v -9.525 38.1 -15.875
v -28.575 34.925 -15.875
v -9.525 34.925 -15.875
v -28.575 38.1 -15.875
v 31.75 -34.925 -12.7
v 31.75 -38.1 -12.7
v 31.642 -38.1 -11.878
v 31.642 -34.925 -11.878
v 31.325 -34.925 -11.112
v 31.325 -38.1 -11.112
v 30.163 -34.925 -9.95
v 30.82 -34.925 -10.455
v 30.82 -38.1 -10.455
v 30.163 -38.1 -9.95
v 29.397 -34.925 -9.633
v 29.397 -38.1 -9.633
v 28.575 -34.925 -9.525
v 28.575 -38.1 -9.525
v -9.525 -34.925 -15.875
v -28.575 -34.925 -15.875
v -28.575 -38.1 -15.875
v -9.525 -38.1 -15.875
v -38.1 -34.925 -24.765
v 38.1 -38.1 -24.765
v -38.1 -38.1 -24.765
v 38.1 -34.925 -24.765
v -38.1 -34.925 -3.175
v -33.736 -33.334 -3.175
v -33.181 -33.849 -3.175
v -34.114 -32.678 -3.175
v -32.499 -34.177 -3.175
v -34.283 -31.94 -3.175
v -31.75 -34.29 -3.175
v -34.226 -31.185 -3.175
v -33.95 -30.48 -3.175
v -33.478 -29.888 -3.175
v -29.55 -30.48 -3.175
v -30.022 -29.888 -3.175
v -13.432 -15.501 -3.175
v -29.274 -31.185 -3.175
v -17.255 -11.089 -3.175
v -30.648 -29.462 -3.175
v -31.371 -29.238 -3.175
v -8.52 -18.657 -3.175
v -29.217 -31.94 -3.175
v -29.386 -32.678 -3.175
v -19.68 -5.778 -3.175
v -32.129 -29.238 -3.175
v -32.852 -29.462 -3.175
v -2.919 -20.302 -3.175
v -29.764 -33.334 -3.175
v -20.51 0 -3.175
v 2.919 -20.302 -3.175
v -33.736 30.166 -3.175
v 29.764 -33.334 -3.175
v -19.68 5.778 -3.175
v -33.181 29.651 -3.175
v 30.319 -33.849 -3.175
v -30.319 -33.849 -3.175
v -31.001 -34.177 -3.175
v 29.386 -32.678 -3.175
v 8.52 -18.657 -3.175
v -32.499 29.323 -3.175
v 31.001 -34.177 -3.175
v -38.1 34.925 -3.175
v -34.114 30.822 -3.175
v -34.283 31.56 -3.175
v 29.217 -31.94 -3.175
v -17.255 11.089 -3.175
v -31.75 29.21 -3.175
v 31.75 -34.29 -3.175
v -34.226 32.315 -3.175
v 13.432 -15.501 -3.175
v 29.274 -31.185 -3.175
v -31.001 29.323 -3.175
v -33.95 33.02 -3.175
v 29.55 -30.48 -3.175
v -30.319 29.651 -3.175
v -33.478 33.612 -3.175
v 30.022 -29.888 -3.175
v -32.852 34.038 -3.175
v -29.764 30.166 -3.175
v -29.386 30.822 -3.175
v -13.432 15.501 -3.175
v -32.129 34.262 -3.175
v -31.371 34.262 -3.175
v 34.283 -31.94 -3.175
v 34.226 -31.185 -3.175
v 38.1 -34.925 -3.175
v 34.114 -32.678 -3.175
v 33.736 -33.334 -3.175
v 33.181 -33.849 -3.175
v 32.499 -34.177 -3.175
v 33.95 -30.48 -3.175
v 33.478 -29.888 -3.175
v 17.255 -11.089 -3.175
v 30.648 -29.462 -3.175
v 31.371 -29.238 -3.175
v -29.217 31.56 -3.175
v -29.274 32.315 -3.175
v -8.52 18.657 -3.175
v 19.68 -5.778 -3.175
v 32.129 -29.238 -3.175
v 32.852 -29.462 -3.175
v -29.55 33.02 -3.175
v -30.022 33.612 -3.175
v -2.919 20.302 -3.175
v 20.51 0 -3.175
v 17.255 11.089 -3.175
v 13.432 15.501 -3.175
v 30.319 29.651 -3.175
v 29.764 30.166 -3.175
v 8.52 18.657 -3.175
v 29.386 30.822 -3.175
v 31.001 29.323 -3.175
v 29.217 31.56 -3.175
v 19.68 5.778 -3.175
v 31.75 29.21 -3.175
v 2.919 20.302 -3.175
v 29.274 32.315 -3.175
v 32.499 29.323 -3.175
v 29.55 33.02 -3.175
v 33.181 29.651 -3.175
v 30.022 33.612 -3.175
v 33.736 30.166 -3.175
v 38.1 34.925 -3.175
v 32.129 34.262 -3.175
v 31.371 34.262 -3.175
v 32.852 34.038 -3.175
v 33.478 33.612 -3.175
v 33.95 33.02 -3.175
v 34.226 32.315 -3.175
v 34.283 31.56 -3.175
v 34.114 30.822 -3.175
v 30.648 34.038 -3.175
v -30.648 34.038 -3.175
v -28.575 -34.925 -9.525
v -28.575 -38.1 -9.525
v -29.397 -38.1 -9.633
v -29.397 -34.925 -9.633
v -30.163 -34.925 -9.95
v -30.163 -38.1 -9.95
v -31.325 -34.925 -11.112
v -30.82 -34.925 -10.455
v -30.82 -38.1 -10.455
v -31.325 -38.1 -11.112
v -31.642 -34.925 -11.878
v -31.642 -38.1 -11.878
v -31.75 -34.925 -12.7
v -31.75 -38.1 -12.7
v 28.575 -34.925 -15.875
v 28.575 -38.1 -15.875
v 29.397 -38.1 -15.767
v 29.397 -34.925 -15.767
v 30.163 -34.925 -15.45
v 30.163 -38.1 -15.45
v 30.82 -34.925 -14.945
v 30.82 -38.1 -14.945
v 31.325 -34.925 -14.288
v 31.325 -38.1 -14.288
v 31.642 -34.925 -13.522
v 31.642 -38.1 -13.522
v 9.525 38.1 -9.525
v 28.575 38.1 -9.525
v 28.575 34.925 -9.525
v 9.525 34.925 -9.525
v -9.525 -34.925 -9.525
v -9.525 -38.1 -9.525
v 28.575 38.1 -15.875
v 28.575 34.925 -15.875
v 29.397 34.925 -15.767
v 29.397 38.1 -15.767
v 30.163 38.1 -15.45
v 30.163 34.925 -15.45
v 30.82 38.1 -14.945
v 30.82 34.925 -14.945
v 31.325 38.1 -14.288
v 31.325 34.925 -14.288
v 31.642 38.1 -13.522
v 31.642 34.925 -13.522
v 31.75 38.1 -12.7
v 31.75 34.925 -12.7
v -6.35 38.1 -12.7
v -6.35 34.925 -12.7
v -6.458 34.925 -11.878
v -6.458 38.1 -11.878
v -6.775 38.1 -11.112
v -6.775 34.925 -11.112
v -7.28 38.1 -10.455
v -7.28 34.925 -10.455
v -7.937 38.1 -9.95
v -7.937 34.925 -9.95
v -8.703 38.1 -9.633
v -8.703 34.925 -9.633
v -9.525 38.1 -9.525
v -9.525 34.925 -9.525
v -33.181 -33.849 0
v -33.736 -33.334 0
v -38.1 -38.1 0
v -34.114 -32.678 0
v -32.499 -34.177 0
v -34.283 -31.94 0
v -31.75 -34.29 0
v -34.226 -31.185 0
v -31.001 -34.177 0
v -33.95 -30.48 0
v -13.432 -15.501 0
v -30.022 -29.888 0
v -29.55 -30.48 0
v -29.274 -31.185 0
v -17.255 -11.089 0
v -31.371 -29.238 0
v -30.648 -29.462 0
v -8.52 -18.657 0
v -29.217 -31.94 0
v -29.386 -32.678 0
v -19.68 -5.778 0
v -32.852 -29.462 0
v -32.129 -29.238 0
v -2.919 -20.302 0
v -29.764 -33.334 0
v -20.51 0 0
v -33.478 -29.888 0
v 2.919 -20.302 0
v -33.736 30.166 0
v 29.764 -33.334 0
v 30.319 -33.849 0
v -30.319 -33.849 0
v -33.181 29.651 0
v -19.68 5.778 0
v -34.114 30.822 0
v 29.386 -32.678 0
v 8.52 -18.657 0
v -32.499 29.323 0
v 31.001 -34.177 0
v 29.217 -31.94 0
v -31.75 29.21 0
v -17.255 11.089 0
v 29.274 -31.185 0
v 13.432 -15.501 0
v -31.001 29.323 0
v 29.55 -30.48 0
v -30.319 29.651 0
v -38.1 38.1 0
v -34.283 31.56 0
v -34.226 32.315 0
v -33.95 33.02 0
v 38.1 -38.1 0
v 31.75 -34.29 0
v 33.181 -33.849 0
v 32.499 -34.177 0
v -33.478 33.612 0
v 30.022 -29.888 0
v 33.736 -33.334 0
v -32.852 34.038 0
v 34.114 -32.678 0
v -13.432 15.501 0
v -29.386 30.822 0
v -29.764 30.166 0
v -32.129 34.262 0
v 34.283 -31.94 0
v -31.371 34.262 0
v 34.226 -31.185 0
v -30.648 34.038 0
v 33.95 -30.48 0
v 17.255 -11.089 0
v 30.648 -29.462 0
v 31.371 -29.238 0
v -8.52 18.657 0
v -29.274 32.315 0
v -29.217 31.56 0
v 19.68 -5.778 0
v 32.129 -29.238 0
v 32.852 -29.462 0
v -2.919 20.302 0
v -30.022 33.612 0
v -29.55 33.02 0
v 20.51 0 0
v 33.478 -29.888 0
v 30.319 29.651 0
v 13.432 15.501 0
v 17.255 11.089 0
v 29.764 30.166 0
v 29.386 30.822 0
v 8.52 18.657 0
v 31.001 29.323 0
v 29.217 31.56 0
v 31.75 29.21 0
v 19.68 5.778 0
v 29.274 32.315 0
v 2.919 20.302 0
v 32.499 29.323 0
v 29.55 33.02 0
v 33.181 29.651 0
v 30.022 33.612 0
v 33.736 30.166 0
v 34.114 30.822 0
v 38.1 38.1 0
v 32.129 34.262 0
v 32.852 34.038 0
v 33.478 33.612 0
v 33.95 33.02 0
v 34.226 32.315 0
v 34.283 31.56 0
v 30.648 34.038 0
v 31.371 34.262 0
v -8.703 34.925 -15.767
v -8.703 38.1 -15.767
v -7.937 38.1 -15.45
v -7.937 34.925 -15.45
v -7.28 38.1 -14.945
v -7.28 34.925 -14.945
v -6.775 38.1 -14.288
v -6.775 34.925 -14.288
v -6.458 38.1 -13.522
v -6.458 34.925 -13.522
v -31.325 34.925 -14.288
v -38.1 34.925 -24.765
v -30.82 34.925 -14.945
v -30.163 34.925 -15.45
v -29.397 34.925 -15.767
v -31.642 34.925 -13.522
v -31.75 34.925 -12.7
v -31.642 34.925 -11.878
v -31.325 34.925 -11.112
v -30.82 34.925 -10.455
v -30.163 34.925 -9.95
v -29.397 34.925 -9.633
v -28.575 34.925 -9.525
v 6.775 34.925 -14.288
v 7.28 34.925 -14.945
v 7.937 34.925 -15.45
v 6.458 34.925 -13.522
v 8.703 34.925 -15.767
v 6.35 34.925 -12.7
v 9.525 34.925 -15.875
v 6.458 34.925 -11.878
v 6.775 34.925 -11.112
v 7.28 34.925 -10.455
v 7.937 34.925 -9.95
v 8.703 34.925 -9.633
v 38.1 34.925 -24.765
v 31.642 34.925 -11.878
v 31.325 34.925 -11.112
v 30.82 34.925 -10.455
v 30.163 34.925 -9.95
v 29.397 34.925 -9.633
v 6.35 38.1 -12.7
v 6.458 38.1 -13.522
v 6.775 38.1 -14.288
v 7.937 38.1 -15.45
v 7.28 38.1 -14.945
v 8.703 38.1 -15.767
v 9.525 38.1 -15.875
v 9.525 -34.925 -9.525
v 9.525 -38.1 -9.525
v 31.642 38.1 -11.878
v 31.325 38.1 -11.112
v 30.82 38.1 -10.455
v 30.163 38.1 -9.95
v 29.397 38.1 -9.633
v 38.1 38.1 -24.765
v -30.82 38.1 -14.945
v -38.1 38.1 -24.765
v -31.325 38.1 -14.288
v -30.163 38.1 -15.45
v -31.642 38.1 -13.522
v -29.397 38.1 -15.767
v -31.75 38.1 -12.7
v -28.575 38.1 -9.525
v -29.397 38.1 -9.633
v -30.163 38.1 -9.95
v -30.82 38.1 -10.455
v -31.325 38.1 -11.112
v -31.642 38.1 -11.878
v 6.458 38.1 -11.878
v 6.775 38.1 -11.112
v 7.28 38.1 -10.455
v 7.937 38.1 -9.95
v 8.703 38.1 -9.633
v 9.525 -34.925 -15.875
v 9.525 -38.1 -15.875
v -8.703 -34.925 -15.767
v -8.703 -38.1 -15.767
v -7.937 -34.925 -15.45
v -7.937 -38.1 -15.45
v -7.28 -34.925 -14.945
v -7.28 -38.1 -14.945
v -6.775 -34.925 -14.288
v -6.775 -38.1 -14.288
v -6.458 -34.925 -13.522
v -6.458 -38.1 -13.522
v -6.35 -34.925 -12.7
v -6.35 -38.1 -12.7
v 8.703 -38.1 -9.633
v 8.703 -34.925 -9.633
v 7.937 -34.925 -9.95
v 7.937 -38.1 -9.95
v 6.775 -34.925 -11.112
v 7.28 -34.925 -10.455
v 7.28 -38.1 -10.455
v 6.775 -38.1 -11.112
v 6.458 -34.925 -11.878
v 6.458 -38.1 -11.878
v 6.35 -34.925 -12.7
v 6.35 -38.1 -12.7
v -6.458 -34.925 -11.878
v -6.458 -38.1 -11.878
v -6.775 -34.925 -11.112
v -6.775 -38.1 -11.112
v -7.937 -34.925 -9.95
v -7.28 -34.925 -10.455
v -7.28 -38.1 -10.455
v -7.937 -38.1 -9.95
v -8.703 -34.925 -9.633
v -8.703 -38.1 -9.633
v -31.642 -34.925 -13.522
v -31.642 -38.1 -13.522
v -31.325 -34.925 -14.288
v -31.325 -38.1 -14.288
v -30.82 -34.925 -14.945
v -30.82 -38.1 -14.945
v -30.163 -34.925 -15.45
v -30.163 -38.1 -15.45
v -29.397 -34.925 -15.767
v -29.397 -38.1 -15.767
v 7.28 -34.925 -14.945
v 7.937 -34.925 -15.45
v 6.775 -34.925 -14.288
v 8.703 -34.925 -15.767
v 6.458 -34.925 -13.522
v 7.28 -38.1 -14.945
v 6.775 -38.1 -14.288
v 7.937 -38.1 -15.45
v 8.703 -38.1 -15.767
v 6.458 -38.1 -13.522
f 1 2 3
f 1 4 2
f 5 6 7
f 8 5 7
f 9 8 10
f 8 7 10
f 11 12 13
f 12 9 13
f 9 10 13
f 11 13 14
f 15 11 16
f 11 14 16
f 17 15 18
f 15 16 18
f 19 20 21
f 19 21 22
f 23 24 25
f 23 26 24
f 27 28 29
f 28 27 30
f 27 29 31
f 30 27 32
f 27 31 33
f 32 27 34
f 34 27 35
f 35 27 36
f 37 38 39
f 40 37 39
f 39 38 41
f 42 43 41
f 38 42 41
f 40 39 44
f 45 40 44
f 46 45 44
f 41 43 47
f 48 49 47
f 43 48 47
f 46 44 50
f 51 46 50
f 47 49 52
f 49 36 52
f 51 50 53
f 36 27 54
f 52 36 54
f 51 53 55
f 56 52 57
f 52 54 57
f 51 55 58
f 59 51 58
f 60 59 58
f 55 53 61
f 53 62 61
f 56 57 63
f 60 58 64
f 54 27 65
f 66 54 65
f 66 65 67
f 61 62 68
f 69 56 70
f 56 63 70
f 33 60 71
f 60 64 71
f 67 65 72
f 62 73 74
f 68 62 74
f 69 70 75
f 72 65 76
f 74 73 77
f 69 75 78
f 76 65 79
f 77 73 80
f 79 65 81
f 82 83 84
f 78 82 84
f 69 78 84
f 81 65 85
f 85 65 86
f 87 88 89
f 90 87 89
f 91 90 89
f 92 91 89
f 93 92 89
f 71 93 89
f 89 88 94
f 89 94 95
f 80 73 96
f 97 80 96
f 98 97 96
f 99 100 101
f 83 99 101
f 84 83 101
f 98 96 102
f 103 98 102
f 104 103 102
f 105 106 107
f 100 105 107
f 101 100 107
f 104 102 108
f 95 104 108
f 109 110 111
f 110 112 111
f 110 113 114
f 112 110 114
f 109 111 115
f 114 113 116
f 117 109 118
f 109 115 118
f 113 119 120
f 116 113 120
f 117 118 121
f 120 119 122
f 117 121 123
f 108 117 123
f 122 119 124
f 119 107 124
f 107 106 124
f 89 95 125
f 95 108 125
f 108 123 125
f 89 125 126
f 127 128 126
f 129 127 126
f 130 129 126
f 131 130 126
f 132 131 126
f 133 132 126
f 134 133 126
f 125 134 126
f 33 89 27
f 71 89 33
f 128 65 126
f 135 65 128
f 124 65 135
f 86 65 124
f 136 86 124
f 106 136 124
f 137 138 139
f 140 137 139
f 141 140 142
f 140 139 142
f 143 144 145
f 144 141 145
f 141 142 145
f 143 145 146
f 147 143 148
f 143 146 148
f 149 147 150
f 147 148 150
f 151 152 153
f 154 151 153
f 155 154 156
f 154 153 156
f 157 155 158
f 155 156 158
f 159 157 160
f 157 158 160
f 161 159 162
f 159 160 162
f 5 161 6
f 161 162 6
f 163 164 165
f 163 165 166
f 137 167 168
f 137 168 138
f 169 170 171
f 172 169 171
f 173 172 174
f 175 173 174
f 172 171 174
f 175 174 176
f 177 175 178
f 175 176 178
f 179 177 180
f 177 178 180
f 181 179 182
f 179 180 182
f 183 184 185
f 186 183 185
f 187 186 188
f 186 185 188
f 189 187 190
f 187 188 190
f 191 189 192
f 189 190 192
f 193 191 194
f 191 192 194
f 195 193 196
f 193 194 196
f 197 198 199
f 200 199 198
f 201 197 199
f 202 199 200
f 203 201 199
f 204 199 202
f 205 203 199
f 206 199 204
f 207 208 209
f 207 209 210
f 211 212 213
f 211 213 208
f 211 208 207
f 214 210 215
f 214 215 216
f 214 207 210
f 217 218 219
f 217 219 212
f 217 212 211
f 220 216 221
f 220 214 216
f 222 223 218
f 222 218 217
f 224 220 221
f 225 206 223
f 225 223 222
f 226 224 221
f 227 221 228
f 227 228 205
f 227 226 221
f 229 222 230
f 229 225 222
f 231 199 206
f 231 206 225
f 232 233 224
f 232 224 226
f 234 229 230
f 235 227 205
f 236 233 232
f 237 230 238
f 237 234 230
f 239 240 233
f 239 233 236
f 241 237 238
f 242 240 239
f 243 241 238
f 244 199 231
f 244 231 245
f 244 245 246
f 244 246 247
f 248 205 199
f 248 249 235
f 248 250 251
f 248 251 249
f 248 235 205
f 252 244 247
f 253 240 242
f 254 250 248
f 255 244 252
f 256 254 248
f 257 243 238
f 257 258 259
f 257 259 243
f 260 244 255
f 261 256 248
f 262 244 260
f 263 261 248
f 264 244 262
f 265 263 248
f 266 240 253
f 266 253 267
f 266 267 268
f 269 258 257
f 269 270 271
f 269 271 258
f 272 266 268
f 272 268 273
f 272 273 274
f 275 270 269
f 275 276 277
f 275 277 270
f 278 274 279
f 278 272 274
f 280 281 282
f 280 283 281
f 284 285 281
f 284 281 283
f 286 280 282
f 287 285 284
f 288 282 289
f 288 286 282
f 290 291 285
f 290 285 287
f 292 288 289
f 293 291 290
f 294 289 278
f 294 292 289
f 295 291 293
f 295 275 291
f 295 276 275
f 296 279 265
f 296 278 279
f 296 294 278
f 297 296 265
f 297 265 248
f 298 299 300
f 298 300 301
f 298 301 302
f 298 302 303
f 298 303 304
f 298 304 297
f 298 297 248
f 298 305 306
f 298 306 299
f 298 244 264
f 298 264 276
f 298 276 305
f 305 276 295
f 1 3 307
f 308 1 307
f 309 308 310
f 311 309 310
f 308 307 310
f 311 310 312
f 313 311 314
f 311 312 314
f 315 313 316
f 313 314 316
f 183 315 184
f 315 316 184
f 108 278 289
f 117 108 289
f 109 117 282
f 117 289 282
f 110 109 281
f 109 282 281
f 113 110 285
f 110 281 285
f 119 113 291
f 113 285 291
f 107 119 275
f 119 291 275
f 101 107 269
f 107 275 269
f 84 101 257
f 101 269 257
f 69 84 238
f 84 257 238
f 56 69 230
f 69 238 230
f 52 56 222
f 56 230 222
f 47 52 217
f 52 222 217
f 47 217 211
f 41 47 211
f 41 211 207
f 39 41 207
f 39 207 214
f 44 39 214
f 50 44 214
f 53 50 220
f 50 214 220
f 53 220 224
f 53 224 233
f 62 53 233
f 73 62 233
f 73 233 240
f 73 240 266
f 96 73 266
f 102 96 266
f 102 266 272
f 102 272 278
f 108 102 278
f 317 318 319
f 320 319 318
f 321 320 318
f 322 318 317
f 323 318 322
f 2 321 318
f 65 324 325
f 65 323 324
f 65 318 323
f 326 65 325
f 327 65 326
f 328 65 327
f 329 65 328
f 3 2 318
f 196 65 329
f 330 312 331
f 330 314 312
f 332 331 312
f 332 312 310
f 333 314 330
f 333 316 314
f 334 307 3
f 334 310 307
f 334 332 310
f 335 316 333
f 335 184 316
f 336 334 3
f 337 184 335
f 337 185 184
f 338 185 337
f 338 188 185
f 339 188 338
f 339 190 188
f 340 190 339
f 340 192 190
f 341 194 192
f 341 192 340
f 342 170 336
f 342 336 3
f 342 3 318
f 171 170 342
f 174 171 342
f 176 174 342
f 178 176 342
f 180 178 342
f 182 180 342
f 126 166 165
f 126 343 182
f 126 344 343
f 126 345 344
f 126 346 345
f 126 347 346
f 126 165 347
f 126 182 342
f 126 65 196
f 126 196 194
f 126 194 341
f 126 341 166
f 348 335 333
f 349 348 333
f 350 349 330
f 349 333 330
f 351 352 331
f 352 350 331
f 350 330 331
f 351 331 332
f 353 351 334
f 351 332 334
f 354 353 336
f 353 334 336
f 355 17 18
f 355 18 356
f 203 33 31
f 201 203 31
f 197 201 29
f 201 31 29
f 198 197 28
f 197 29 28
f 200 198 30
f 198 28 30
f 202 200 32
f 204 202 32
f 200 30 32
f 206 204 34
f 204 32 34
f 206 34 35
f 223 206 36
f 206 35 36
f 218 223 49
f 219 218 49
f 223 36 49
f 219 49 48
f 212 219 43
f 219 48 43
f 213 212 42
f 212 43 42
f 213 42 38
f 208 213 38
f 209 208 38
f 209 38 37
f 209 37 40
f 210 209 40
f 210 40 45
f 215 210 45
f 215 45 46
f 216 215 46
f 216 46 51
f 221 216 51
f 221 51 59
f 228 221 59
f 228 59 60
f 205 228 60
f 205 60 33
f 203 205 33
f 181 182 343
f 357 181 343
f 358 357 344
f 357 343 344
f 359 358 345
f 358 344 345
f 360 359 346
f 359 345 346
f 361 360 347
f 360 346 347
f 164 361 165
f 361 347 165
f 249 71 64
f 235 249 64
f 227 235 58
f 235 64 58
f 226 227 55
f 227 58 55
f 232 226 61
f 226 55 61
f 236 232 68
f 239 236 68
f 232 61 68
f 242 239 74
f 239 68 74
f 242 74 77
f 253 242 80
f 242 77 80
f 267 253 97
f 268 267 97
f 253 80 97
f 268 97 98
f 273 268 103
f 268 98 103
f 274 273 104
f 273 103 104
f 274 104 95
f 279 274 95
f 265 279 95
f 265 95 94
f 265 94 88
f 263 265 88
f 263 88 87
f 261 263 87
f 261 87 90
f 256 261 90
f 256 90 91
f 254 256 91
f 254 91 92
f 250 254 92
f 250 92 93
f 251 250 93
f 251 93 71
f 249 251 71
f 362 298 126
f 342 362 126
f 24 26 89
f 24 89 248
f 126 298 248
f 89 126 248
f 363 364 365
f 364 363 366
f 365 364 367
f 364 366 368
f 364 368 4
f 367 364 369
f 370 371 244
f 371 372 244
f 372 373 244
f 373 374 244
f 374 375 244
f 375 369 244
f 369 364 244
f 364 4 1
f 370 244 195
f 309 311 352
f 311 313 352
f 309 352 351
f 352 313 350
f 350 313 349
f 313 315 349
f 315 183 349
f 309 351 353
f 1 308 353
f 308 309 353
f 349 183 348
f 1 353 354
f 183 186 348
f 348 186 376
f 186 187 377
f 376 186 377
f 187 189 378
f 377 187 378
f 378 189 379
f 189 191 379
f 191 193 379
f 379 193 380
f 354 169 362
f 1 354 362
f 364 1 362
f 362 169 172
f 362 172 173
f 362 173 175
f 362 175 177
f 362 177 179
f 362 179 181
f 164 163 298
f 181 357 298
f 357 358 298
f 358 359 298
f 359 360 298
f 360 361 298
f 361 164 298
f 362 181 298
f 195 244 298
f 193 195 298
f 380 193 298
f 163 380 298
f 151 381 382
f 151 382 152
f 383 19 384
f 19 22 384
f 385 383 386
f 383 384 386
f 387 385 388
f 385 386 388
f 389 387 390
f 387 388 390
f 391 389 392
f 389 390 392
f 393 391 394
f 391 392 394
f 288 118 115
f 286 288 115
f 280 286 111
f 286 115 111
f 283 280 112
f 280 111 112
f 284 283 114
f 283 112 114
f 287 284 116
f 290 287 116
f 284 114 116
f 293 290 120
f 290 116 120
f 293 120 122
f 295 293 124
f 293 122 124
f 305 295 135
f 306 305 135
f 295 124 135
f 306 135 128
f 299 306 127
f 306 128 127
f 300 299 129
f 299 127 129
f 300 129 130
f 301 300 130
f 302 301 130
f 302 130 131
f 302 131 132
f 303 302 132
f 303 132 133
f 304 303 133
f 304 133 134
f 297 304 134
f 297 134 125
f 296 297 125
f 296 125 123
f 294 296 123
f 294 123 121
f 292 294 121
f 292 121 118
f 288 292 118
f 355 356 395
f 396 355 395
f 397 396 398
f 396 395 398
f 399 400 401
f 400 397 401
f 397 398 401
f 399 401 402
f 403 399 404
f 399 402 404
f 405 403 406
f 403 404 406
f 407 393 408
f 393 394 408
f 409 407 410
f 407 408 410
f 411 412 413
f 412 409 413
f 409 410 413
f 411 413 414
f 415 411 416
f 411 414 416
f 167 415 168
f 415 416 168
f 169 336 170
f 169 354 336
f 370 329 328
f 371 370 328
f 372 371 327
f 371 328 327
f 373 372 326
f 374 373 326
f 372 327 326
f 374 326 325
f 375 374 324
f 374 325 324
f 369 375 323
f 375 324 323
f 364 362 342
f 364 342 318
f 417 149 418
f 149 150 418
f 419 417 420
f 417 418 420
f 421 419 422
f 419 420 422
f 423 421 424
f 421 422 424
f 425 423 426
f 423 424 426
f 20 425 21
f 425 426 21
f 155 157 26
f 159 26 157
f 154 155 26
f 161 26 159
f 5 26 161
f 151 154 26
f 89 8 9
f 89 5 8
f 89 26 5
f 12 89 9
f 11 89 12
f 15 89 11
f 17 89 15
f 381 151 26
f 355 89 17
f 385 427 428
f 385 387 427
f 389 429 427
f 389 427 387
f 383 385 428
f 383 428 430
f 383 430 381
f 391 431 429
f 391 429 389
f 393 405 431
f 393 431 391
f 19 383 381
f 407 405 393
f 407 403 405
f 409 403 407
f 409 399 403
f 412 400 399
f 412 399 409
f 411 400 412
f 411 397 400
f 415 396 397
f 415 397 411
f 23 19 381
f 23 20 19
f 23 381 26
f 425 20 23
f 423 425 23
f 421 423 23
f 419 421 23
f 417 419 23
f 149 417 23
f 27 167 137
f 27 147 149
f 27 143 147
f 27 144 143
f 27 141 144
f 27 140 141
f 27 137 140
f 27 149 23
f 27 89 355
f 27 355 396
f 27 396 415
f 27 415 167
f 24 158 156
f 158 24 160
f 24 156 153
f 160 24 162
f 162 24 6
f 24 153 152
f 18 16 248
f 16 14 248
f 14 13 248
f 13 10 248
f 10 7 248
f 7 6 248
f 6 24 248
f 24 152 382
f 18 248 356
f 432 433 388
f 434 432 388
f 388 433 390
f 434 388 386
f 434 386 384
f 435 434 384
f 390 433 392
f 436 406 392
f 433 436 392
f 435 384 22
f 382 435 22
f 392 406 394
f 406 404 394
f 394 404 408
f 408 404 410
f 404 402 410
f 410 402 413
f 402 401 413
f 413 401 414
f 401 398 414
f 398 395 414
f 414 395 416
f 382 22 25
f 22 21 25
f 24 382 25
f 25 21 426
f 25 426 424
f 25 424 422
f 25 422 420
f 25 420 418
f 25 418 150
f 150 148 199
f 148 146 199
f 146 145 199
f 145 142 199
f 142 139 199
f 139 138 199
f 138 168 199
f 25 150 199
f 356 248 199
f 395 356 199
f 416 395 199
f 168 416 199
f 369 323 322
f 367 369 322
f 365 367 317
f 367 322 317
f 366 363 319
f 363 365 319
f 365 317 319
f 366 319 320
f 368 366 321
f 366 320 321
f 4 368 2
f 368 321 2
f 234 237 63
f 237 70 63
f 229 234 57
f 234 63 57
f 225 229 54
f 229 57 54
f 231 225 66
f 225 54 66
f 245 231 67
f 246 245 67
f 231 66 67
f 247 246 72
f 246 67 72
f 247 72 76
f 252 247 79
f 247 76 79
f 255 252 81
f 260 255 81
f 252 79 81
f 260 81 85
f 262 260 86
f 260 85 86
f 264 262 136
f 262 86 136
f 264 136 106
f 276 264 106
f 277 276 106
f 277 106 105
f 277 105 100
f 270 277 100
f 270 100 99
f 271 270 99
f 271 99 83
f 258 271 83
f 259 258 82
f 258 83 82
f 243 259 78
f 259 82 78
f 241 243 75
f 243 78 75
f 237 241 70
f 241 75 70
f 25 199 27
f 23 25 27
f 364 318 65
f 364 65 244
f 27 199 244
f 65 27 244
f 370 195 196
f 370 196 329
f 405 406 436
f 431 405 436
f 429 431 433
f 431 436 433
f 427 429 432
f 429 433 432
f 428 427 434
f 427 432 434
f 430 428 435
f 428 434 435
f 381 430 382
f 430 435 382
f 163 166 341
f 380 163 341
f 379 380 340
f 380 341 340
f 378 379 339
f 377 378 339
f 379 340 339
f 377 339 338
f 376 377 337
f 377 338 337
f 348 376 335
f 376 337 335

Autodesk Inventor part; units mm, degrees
ref_plane "YZ Plane" through (0, 0, 0) normal (1, 0, 0) x (0, 1, 0)
ref_plane "XZ Plane" through (0, 0, 0) normal (0, 1, 0) x (-1, 0, 0)
ref_plane "XY Plane" through (0, 0, 0) normal (0, 0, 1) x (1, 0, 0)
sketch "Sketch1" plane through (0, 0, 0) normal (0, 0, 1) x (1, 0, 0)
  line L0 (-38.1, 38.1) -> (38.1, 38.1)
  line L1 (38.1, 38.1) -> (38.1, -38.1)
  line L2 (38.1, -38.1) -> (-38.1, -38.1)
  line L3 (-38.1, -38.1) -> (-38.1, 38.1)
  circle A0 centre (0, 0) radius 20.5105
  point P0 (-31.75, 31.75)
  point P1 (31.75, 31.75)
  point P2 (31.75, -31.75)
  point P3 (-31.75, -31.75)
  dimension "d0" = 76.2
  dimension "d1" = 76.2
  dimension "d2" = 38.1
  dimension "d3" = 38.1
  dimension "d4" = 41.021
  dimension "d5" = 6.35
  dimension "d6" = 6.35
  dimension "d7" = 6.35
  dimension "d8" = 6.35
extrude "Extrusion1" add sketch "Sketch1" against normal blind 3.175
hole "Hole1" at (-31.75, 31.75, 0) at (31.75, 31.75, 0) at (31.75, -31.75, 0) at (-31.75, -31.75, 0) direction (0, 0, -1) diameter 5.08 end through all
sketch "Sketch3" plane through (0, 0, -3.175) normal (0, 0, -1) x (-1, 0, 0)
  line L0 (38.1, 38.1) -> (38.1, -38.1) projected
  line L1 (-38.1, -38.1) -> (-38.1, 38.1) projected
  line L2 (38.1, -38.1) -> (-38.1, -38.1) projected
  line L3 (-38.1, 38.1) -> (38.1, 38.1)
  line L4 (38.1, 38.1) -> (38.1, 34.925)
  line L5 (38.1, 34.925) -> (-38.1, 34.925)
  line L6 (-38.1, 34.925) -> (-38.1, 38.1)
  line L7 (-38.1, -34.925) -> (38.1, -34.925)
  line L8 (38.1, -34.925) -> (38.1, -38.1)
  line L9 (38.1, -38.1) -> (-38.1, -38.1)
  line L10 (-38.1, -38.1) -> (-38.1, -34.925)
  dimension "d32" = 3.175
  dimension "d33" = 3.175
extrude "Extrusion2" add sketch "Sketch3" along normal blind 21.59 contours L0 L5 L1 L3 | L0 L2 L1 L7
sketch "Sketch4" plane through (-38.1, 38.1, 0) normal (0, 1, 0) x (1, 0, 0)
  line L0 (0, 0) -> (0, 24.765) projected
  line L1 (0, 0) -> (76.2, 0) projected
  line L2 (76.2, 0) -> (76.2, 24.765) projected
  line L3 (6.35, 15.875) -> (31.75, 15.875)
  line L4 (31.75, 15.875) -> (31.75, 9.525)
  line L5 (31.75, 9.525) -> (6.35, 9.525)
  line L6 (6.35, 9.525) -> (6.35, 15.875)
  line L7 (44.45, 15.875) -> (69.85, 15.875)
  line L8 (69.85, 15.875) -> (69.85, 9.525)
  line L9 (69.85, 9.525) -> (44.45, 9.525)
  line L10 (44.45, 9.525) -> (44.45, 15.875)
  point P0 (38.1, 0)
  dimension "d36" = 6.35
  dimension "d37" = 9.525
  dimension "d38" = 6.35
  dimension "d39" = 6.35
  dimension "d40" = 25.4
  dimension "d41" = 6.35
  dimension "d42" = 25.4
extrude "Extrusion3" cut sketch "Sketch4" against normal through all
fillet "Fillet1" radius 3.175 16 edges at (6.35, 36.5125, -9.525) (6.35, 36.5125, -15.875) (31.75, 36.5125, -15.875) (31.75, 36.5125, -9.525) (-6.35, 36.5125, -9.525) (-6.35, 36.5125, -15.875) (-31.75, 36.5125, -15.875) (-31.75, 36.5125, -9.525) (6.35, -36.5125, -9.525) (6.35, -36.5125, -15.875) (31.75, -36.5125, -15.875) (31.75, -36.5125, -9.525) (-6.35, -36.5125, -9.525) (-6.35, -36.5125, -15.875) (-31.75, -36.5125, -15.875) (-31.75, -36.5125, -9.525)
equation "\"d2\" = 0.5 * d1"
equation "\"d3\" = 0.5 * d0"
equation "\"d7\" = d6"
equation "\"d8\" = d5"
equation "\"d38\" = d36"
equation "\"d41\" = d39"
equation "\"d42\" = d40"
properties part number "Btm Plate BD Motor mount"
